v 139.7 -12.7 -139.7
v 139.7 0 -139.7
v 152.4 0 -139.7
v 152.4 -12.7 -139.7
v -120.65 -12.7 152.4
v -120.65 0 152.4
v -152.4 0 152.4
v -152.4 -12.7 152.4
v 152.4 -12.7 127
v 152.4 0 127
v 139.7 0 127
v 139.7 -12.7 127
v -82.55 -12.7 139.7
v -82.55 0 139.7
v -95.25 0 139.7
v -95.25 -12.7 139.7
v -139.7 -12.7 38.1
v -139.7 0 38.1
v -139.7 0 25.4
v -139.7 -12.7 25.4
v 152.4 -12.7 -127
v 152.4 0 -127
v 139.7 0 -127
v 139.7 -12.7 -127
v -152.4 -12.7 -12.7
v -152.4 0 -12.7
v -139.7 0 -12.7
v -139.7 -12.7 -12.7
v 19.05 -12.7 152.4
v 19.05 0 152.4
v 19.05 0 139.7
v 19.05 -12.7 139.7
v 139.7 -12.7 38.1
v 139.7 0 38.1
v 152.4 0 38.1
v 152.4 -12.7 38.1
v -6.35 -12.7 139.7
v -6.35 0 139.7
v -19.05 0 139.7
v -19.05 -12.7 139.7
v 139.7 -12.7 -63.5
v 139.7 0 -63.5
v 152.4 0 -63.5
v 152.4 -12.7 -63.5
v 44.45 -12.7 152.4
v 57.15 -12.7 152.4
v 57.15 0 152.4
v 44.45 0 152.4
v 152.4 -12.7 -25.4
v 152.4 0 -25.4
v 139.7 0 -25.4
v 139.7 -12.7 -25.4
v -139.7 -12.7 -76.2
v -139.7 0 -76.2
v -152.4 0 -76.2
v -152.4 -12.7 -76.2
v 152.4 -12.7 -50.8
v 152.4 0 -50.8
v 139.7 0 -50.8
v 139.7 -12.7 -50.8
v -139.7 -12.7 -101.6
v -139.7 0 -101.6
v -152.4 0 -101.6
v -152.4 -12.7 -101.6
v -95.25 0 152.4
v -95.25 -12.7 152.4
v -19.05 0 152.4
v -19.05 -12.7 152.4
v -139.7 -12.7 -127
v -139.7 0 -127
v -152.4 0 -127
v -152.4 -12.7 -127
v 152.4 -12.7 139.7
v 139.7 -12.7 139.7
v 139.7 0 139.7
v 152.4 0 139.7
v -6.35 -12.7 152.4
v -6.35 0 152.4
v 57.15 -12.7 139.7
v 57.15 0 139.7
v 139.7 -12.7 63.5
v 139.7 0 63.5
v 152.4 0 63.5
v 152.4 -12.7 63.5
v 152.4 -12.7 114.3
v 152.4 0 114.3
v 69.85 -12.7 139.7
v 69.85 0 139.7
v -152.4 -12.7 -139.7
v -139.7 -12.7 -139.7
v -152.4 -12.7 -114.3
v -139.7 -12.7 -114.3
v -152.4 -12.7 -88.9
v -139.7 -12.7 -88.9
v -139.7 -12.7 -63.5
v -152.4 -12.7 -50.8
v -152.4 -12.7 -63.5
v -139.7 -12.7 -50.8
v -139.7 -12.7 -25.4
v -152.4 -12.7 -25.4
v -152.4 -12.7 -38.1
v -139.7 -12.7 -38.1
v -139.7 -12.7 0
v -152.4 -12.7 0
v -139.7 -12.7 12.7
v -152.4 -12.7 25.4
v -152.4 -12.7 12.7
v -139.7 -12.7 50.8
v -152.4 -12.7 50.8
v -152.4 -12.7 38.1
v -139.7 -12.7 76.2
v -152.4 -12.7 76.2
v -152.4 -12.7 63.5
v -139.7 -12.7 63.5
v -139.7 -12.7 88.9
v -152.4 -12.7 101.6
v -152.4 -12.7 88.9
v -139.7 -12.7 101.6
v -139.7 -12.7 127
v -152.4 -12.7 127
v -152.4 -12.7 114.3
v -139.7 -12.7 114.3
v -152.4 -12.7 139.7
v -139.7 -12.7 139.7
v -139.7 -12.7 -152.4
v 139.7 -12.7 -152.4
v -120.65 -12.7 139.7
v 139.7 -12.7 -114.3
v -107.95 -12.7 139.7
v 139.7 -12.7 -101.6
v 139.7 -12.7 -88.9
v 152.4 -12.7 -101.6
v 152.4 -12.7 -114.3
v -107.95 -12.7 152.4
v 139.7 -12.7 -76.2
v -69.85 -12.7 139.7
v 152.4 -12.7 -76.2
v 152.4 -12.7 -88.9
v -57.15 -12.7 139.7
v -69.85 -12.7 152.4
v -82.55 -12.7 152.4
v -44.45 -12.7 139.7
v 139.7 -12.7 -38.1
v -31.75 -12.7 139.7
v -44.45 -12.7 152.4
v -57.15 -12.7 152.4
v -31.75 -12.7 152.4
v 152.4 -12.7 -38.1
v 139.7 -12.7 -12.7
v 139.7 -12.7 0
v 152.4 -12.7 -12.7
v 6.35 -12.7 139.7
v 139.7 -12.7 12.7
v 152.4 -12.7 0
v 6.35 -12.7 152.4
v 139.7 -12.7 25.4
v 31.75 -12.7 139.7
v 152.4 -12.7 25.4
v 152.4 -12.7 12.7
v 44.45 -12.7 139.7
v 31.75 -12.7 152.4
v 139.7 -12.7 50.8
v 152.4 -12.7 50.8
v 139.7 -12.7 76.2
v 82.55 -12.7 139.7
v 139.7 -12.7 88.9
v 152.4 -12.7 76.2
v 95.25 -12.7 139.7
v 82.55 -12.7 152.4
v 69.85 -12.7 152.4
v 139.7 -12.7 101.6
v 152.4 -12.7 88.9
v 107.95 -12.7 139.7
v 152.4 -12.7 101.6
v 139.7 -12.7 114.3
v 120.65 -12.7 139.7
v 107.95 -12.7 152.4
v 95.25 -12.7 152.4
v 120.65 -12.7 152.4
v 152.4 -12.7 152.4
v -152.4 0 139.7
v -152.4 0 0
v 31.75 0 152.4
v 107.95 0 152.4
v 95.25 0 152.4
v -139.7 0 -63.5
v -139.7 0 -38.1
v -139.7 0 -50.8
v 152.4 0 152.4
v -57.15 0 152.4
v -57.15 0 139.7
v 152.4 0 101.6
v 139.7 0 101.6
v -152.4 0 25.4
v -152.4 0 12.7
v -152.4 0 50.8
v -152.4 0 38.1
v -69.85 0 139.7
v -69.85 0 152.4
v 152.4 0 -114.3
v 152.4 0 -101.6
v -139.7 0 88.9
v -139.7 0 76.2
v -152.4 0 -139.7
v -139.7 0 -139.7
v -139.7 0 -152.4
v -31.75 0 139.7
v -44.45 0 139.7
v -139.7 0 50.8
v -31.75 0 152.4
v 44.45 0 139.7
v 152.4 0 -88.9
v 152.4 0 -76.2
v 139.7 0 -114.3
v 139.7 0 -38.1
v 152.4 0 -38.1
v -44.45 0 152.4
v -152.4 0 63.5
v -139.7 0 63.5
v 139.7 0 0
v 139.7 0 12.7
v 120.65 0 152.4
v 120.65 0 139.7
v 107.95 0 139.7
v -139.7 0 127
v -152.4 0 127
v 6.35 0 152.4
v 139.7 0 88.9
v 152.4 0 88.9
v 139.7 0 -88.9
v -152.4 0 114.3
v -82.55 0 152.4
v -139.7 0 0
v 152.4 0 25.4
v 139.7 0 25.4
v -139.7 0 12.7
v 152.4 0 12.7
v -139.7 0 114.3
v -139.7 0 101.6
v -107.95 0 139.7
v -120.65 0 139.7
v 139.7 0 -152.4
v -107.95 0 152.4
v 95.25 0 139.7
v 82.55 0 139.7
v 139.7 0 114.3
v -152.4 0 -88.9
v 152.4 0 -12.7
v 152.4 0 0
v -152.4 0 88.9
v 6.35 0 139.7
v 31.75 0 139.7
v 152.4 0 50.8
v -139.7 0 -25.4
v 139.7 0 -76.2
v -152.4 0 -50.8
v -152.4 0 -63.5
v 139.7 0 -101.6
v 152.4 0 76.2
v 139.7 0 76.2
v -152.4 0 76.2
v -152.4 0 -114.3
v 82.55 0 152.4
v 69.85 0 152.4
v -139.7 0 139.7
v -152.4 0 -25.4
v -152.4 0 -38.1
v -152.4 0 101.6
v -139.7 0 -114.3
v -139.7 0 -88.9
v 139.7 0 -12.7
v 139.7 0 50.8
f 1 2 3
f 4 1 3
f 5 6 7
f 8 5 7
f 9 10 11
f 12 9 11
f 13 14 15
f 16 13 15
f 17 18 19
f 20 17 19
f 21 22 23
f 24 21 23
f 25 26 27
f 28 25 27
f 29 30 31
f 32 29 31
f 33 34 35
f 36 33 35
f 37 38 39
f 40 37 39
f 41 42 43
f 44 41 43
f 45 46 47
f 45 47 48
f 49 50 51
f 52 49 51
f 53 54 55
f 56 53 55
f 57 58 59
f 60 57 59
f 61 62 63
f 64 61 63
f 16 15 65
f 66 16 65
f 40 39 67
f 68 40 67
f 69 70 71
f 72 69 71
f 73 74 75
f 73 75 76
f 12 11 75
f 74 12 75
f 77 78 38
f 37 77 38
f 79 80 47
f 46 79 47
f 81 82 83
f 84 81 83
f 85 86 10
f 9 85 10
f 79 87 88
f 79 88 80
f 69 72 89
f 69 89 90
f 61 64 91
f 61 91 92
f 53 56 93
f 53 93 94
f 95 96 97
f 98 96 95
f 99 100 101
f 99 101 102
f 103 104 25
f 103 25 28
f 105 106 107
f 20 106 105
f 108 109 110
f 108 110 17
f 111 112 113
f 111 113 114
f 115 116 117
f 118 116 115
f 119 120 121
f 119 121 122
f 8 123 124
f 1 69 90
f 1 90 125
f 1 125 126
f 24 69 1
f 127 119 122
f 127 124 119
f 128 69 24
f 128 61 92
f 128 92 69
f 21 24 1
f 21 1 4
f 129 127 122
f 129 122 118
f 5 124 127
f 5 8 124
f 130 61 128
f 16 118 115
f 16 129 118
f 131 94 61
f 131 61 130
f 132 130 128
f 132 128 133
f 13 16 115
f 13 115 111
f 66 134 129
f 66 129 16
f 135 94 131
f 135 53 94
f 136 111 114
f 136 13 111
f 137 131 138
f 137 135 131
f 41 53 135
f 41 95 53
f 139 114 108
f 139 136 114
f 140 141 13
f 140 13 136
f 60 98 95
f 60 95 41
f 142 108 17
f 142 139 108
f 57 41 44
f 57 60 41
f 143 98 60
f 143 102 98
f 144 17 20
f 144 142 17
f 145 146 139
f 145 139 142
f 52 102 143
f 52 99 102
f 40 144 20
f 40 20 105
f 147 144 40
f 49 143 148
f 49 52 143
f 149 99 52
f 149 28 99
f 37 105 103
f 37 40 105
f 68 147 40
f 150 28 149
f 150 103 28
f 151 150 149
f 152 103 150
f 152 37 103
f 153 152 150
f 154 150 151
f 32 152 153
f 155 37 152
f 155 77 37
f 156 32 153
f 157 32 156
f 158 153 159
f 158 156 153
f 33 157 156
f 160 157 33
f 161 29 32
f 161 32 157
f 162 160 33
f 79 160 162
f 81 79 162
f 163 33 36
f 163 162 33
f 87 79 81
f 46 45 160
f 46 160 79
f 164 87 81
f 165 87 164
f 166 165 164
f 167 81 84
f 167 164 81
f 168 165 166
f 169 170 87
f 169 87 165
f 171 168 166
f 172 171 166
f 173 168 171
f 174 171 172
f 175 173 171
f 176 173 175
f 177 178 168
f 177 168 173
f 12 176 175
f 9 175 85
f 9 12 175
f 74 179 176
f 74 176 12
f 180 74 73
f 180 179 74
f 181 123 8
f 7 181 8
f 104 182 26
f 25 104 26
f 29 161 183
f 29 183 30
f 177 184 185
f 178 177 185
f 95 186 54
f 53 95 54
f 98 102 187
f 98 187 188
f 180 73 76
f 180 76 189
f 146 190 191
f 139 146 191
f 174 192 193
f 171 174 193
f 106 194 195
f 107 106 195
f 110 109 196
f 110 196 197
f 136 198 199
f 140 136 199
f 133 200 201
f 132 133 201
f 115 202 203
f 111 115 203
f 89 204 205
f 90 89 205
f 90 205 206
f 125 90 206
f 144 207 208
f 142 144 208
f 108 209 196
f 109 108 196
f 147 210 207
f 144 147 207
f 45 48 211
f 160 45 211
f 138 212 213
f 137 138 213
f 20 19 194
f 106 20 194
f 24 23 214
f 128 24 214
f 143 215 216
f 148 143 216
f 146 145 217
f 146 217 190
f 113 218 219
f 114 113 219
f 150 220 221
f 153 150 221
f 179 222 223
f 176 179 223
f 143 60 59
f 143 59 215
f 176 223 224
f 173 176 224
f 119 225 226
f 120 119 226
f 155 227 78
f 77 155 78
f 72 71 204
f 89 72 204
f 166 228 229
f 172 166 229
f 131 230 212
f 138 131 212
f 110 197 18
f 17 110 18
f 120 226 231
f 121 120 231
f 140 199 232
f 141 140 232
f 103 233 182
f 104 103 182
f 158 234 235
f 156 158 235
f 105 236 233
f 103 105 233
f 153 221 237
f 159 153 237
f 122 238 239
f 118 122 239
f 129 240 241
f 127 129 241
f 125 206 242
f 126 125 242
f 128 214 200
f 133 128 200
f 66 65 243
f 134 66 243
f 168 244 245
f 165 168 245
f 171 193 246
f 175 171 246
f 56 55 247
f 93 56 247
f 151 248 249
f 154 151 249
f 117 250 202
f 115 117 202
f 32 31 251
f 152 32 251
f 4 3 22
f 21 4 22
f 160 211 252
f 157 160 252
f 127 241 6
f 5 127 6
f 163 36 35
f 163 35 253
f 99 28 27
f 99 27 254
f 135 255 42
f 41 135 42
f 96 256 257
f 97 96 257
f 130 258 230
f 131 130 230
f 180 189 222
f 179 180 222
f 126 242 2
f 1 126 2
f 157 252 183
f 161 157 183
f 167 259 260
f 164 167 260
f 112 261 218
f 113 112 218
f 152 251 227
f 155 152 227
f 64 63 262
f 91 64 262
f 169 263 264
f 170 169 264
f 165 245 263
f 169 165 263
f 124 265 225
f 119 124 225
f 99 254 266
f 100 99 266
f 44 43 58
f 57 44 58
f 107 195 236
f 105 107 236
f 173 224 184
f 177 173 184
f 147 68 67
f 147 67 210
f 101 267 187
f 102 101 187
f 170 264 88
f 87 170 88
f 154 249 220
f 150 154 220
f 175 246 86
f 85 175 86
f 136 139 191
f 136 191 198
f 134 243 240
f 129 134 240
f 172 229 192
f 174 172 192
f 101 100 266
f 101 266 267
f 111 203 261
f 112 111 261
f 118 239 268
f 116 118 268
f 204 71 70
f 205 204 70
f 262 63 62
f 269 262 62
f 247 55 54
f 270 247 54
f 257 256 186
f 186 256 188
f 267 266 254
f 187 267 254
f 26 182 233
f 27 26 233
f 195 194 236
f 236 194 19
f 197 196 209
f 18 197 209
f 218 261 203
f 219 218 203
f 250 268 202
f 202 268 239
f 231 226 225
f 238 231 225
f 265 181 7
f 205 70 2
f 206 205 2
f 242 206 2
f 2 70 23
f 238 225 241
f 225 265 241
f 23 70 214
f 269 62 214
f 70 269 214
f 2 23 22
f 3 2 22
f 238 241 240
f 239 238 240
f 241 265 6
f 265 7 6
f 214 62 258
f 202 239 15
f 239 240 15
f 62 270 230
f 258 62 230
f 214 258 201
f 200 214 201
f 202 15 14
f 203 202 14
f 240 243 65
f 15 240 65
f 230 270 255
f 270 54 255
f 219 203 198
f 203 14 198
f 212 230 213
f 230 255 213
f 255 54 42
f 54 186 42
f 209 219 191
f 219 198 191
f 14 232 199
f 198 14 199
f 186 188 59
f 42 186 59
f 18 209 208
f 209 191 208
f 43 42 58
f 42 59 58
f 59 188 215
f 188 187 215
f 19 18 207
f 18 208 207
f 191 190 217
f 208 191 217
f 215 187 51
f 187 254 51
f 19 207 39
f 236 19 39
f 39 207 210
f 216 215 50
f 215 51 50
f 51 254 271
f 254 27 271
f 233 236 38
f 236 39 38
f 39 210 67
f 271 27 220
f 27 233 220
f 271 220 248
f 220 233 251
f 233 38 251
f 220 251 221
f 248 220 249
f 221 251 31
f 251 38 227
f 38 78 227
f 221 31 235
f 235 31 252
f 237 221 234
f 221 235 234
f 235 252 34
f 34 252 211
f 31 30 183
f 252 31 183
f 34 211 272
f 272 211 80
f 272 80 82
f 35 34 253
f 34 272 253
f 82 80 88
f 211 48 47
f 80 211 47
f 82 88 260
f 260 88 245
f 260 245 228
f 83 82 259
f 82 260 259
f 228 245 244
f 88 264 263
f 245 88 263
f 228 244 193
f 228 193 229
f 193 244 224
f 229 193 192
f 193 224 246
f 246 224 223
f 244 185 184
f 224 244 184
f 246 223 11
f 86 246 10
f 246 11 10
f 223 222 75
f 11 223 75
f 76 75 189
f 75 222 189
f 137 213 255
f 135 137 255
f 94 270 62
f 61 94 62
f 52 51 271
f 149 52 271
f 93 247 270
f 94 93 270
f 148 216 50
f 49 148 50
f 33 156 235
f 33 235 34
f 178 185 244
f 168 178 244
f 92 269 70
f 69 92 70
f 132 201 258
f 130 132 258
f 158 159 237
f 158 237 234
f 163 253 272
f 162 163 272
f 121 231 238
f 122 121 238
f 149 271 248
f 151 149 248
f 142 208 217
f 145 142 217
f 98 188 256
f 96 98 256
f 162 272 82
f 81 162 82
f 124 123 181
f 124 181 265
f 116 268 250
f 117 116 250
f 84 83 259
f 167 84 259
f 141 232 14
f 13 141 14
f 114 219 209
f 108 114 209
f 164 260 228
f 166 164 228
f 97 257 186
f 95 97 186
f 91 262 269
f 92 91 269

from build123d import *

# Parameters (mm, degrees)
F0_W     = 12.7
F0_H     = 12.7
F1_DEPTH = 12.7


with BuildPart() as f1:
    # F0 (on Front) → F1 (new body)
    with BuildSketch(Plane.XZ):
        with Locations((146.05, 146.05)):
            Rectangle(F0_W, F0_H)
        Polygon((139.7, 139.7), (139.7, 152.4), (120.65, 152.4), (120.65, 139.7), (107.95, 139.7), (107.95, 152.4), (95.25, 152.4), (95.25, 139.7), (82.55, 139.7), (82.55, 152.4), (69.85, 152.4), (69.85, 139.7), (57.15, 139.7), (57.15, 152.4), (44.45, 152.4), (44.45, 139.7), (31.75, 139.7), (31.75, 152.4), (19.05, 152.4), (19.05, 139.7), (6.35, 139.7), (6.35, 152.4), (-6.35, 152.4), (-6.35, 139.7), (-19.05, 139.7), (-19.05, 152.4), (-31.75, 152.4), (-31.75, 139.7), (-44.45, 139.7), (-44.45, 152.4), (-57.15, 152.4), (-57.15, 139.7), (-69.85, 139.7), (-69.85, 152.4), (-82.55, 152.4), (-82.55, 139.7), (-95.25, 139.7), (-95.25, 152.4), (-107.95, 152.4), (-107.95, 139.7), (-120.65, 139.7), (-120.65, 152.4), (-139.7, 152.4), (-139.7, 139.7), (-139.7, 127), (-152.4, 127), (-152.4, 114.3), (-139.7, 114.3), (-139.7, 101.6), (-152.4, 101.6), (-152.4, 88.9), (-139.7, 88.9), (-139.7, 76.2), (-152.4, 76.2), (-152.4, 63.5), (-139.7, 63.5), (-139.7, 50.8), (-152.4, 50.8), (-152.4, 38.1), (-139.7, 38.1), (-139.7, 25.4), (-152.4, 25.4), (-152.4, 12.7), (-139.7, 12.7), (-139.7, 0), (-152.4, 0), (-152.4, -12.7), (-139.7, -12.7), (-139.7, -25.4), (-152.4, -25.4), (-152.4, -38.1), (-139.7, -38.1), (-139.7, -50.8), (-152.4, -50.8), (-152.4, -63.5), (-139.7, -63.5), (-139.7, -76.2), (-152.4, -76.2), (-152.4, -88.9), (-139.7, -88.9), (-139.7, -101.6), (-152.4, -101.6), (-152.4, -114.3), (-139.7, -114.3), (-139.7, -127), (-152.4, -127), (-152.4, -139.7), (-139.7, -139.7), (-139.7, -152.4), (139.7, -152.4), (139.7, -139.7), (152.4, -139.7), (152.4, -127), (139.7, -127), (139.7, -114.3), (152.4, -114.3), (152.4, -101.6), (139.7, -101.6), (139.7, -88.9), (152.4, -88.9), (152.4, -76.2), (139.7, -76.2), (139.7, -63.5), (152.4, -63.5), (152.4, -50.8), (139.7, -50.8), (139.7, -38.1), (152.4, -38.1), (152.4, -25.4), (139.7, -25.4), (139.7, -12.7), (152.4, -12.7), (152.4, 0), (139.7, 0), (139.7, 12.7), (152.4, 12.7), (152.4, 25.4), (139.7, 25.4), (139.7, 38.1), (152.4, 38.1), (152.4, 50.8), (139.7, 50.8), (139.7, 63.5), (152.4, 63.5), (152.4, 76.2), (139.7, 76.2), (139.7, 88.9), (152.4, 88.9), (152.4, 101.6), (139.7, 101.6), (139.7, 114.3), (152.4, 114.3), (152.4, 127), (139.7, 127), align=None)
        with Locations((-146.05, 146.05)):
            Rectangle(F0_W, F0_H)
    extrude(amount=F1_DEPTH)


solid = f1.part
